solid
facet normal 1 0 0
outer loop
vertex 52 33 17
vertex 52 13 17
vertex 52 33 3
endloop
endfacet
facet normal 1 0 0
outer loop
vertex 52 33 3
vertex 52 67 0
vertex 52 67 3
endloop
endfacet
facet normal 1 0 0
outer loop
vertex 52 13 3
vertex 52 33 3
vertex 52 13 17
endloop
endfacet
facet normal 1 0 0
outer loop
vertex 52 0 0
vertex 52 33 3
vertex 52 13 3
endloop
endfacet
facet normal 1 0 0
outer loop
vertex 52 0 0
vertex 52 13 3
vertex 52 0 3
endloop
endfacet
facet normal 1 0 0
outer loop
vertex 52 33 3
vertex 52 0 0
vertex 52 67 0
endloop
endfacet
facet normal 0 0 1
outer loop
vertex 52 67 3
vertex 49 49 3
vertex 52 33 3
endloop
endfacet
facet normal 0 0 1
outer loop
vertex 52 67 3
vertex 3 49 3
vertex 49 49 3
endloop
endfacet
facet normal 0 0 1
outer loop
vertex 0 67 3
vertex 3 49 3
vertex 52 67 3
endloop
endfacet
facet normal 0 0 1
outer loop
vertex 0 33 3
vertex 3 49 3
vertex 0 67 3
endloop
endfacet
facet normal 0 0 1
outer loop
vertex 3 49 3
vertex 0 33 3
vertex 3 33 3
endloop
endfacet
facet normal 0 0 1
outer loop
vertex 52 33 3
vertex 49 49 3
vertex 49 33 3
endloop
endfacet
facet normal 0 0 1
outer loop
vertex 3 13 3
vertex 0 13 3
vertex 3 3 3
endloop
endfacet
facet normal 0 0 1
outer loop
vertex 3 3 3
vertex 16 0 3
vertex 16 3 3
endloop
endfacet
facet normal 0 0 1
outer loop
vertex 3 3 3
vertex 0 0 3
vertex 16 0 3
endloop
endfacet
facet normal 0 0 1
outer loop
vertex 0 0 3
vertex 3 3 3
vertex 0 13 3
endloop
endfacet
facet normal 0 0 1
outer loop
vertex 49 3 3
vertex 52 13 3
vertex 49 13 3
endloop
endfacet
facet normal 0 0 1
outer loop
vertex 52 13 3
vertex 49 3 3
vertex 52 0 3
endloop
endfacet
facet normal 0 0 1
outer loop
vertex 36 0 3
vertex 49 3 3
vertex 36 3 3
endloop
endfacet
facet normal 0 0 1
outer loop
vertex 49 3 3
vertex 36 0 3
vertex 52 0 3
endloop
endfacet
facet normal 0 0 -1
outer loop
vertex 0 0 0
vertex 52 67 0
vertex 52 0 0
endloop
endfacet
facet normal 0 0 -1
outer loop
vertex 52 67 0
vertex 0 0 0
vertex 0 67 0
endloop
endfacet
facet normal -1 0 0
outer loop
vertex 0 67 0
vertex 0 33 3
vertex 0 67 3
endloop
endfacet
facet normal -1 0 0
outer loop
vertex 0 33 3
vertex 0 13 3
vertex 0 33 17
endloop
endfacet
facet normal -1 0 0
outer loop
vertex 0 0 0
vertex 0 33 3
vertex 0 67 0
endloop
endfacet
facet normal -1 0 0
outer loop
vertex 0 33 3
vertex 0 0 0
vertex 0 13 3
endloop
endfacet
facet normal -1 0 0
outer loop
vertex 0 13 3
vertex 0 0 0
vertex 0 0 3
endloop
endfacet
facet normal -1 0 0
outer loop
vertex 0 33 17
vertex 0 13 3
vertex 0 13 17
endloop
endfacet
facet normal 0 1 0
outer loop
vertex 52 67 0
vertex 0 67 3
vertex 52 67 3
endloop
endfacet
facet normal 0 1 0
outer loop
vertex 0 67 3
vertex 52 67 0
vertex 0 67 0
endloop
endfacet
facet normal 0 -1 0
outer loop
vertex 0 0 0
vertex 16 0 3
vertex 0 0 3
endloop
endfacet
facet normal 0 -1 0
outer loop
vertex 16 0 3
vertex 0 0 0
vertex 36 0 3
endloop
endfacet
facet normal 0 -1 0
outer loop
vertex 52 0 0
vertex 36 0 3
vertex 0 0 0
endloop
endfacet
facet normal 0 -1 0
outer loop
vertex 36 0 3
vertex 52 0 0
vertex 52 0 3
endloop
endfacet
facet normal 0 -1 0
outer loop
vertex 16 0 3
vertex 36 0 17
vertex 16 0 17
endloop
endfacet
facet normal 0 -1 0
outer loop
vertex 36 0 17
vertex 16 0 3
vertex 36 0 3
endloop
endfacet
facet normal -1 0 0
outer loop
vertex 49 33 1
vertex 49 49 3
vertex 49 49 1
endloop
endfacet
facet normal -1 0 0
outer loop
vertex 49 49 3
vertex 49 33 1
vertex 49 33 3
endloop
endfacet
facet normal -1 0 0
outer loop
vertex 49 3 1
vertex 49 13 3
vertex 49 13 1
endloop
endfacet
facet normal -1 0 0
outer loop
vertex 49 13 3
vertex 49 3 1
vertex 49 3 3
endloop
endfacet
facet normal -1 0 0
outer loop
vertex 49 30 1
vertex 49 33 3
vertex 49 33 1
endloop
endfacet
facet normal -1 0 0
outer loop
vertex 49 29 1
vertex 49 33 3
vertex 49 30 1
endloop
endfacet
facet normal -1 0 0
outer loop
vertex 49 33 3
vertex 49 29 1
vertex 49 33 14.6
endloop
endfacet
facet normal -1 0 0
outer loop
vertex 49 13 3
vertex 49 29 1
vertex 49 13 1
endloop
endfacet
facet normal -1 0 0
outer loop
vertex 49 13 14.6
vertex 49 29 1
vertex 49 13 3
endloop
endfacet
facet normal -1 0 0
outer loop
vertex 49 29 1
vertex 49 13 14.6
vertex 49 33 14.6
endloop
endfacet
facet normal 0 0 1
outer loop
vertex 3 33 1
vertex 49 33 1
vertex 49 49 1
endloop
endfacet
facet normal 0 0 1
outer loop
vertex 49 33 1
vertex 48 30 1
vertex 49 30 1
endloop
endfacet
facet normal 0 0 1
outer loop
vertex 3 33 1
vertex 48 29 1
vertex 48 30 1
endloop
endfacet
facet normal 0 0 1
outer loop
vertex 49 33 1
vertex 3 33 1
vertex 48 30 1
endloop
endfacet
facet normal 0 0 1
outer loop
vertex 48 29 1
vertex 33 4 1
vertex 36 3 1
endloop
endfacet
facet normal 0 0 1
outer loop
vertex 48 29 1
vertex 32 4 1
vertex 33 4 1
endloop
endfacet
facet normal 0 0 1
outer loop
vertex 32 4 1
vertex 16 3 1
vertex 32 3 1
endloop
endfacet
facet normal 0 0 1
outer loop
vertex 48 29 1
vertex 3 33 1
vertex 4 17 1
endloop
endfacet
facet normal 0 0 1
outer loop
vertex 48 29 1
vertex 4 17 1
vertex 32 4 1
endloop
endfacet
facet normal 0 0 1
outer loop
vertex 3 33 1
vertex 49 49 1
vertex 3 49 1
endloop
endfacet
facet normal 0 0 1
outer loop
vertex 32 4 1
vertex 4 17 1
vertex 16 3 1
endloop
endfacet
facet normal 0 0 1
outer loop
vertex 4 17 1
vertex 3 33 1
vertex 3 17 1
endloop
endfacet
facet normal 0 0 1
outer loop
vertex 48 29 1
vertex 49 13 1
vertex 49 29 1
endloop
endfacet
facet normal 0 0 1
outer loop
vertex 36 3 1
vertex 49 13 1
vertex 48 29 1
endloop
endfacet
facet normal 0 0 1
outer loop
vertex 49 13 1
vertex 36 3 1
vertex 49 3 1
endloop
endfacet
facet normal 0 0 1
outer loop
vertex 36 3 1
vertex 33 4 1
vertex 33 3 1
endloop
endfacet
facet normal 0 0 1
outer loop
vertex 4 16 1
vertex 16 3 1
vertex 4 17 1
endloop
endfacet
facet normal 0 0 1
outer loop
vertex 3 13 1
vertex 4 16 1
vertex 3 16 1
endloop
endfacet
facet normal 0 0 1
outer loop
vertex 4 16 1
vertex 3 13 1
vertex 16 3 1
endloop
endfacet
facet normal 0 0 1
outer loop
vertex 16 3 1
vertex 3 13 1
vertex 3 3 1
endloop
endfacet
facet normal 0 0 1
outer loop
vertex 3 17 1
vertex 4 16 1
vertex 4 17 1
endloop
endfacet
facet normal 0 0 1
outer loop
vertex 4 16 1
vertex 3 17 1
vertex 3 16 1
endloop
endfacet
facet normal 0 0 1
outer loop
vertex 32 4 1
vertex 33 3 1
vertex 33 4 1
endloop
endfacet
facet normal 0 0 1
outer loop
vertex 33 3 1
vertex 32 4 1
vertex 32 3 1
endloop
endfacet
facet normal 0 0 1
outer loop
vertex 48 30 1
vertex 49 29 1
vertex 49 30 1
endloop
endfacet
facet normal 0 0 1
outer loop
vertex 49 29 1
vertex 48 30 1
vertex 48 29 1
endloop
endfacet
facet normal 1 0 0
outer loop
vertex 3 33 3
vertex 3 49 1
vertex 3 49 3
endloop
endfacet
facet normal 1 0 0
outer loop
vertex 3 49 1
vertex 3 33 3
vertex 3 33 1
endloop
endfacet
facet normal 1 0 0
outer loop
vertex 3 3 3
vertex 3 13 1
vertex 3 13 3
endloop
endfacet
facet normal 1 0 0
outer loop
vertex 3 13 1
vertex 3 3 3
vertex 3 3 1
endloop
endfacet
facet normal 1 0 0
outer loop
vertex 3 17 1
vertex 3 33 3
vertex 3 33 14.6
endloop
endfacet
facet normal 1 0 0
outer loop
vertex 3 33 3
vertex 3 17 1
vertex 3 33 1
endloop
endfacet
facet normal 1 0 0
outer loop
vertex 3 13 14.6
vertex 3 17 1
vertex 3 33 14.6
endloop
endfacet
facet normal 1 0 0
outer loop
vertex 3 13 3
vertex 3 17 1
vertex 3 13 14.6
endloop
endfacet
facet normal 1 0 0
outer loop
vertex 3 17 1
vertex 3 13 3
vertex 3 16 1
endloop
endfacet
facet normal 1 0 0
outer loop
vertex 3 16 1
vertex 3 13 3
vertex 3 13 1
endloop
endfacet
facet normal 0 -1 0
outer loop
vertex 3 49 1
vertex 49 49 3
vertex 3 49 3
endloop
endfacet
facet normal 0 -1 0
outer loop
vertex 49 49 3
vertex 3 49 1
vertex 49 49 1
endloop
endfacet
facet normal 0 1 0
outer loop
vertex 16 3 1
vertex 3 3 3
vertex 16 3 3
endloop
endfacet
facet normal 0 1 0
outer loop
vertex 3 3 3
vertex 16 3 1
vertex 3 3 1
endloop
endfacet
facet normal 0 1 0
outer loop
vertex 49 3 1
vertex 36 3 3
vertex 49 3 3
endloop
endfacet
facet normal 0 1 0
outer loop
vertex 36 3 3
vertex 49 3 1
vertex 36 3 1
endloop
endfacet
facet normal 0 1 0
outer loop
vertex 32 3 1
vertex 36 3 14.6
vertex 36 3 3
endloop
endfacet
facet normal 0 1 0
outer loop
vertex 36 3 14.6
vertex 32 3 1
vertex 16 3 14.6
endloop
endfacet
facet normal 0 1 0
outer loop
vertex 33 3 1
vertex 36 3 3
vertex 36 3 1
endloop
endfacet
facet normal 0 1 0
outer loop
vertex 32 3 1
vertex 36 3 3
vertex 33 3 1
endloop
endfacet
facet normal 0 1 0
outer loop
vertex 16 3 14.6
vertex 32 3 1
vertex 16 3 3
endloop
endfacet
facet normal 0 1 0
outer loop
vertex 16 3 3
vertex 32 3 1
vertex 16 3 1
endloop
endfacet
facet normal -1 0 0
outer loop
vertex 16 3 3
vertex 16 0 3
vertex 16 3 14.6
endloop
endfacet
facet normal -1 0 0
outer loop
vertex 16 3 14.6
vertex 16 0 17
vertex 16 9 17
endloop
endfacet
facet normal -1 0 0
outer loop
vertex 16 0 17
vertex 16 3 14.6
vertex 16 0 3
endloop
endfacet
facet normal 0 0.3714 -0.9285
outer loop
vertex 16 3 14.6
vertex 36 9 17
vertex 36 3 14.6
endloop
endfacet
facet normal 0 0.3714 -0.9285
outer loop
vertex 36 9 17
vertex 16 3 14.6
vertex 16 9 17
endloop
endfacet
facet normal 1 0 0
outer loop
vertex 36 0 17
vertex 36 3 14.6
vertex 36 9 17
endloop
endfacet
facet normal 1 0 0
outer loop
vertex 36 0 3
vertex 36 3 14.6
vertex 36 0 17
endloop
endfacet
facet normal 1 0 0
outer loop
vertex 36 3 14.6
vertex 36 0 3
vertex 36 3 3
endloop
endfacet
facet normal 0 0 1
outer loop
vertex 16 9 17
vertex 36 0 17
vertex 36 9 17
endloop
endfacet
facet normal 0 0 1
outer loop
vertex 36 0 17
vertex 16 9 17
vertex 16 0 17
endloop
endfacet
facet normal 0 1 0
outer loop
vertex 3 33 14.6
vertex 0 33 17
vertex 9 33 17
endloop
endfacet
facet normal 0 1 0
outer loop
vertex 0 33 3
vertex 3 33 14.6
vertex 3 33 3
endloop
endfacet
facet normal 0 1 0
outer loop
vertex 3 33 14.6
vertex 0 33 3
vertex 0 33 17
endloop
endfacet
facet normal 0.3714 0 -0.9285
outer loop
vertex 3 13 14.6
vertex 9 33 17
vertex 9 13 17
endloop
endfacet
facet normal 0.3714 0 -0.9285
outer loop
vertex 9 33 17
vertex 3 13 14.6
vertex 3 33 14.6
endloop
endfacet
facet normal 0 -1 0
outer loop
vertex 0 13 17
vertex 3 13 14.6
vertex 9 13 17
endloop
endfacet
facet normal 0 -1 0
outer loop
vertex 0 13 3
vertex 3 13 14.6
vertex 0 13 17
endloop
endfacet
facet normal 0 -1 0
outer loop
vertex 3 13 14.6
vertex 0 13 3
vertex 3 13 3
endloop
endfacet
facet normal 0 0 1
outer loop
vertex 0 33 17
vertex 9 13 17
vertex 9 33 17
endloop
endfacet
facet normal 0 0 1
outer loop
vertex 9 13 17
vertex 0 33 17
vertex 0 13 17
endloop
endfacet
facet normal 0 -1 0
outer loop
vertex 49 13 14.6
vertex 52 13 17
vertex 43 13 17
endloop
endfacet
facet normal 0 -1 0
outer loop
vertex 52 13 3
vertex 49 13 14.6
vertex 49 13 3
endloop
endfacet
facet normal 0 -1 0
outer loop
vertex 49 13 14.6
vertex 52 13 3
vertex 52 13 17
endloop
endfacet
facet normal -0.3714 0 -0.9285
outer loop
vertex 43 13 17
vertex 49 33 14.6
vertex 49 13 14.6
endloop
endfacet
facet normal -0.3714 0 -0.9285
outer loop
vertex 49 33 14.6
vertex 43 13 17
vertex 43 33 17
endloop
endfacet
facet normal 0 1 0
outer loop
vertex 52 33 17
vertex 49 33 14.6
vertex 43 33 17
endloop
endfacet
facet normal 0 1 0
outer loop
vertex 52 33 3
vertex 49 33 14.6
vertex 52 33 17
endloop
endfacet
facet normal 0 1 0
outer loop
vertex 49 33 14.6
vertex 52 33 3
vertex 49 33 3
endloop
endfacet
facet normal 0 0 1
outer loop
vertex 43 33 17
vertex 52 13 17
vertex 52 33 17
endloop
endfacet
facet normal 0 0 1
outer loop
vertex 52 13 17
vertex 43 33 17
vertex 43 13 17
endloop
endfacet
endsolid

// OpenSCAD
thickness = 3;
inside_width = 46;
depth = 2;
border = 3;
height = 16;
total_width = inside_width + border * 2;
support_width = 20;
top_border = 15;

module holder(){
    union() {
        cube([support_width, thickness, height]);
        translate(v = [height, thickness, 0])
        {
            rotate(a = [0, 90, 0])
            {
                translate([-support_width + thickness, 0, -height]) 
                { 
                    linear_extrude(height = support_width) 
                    {
                        polygon([[0, thickness * 2], [thickness * 1.2, -thickness], [0, -thickness]]);
                    }
                }
            }
            cube([support_width, thickness]);
        } 
    }
}

union() 
{
    difference() 
    {
        cube([total_width, total_width + top_border, thickness]);
        translate([border, border, thickness - depth])
        {
            cube([inside_width, inside_width, depth]);
        } 
    }
    
    translate(v = [total_width  / 2 - support_width / 2 , 0, 0])
    {
        holder();
    } 
    translate([0, inside_width / 2 + support_width /2, 0 ])
    {
        rotate([0, 0, 270])
        {
            holder();
        } 
    } 
    translate([total_width, inside_width / 2 - support_width /2, 0 ])
    {
        rotate([0, 0, 90])
        {
            holder();
        } 
    } 
}
